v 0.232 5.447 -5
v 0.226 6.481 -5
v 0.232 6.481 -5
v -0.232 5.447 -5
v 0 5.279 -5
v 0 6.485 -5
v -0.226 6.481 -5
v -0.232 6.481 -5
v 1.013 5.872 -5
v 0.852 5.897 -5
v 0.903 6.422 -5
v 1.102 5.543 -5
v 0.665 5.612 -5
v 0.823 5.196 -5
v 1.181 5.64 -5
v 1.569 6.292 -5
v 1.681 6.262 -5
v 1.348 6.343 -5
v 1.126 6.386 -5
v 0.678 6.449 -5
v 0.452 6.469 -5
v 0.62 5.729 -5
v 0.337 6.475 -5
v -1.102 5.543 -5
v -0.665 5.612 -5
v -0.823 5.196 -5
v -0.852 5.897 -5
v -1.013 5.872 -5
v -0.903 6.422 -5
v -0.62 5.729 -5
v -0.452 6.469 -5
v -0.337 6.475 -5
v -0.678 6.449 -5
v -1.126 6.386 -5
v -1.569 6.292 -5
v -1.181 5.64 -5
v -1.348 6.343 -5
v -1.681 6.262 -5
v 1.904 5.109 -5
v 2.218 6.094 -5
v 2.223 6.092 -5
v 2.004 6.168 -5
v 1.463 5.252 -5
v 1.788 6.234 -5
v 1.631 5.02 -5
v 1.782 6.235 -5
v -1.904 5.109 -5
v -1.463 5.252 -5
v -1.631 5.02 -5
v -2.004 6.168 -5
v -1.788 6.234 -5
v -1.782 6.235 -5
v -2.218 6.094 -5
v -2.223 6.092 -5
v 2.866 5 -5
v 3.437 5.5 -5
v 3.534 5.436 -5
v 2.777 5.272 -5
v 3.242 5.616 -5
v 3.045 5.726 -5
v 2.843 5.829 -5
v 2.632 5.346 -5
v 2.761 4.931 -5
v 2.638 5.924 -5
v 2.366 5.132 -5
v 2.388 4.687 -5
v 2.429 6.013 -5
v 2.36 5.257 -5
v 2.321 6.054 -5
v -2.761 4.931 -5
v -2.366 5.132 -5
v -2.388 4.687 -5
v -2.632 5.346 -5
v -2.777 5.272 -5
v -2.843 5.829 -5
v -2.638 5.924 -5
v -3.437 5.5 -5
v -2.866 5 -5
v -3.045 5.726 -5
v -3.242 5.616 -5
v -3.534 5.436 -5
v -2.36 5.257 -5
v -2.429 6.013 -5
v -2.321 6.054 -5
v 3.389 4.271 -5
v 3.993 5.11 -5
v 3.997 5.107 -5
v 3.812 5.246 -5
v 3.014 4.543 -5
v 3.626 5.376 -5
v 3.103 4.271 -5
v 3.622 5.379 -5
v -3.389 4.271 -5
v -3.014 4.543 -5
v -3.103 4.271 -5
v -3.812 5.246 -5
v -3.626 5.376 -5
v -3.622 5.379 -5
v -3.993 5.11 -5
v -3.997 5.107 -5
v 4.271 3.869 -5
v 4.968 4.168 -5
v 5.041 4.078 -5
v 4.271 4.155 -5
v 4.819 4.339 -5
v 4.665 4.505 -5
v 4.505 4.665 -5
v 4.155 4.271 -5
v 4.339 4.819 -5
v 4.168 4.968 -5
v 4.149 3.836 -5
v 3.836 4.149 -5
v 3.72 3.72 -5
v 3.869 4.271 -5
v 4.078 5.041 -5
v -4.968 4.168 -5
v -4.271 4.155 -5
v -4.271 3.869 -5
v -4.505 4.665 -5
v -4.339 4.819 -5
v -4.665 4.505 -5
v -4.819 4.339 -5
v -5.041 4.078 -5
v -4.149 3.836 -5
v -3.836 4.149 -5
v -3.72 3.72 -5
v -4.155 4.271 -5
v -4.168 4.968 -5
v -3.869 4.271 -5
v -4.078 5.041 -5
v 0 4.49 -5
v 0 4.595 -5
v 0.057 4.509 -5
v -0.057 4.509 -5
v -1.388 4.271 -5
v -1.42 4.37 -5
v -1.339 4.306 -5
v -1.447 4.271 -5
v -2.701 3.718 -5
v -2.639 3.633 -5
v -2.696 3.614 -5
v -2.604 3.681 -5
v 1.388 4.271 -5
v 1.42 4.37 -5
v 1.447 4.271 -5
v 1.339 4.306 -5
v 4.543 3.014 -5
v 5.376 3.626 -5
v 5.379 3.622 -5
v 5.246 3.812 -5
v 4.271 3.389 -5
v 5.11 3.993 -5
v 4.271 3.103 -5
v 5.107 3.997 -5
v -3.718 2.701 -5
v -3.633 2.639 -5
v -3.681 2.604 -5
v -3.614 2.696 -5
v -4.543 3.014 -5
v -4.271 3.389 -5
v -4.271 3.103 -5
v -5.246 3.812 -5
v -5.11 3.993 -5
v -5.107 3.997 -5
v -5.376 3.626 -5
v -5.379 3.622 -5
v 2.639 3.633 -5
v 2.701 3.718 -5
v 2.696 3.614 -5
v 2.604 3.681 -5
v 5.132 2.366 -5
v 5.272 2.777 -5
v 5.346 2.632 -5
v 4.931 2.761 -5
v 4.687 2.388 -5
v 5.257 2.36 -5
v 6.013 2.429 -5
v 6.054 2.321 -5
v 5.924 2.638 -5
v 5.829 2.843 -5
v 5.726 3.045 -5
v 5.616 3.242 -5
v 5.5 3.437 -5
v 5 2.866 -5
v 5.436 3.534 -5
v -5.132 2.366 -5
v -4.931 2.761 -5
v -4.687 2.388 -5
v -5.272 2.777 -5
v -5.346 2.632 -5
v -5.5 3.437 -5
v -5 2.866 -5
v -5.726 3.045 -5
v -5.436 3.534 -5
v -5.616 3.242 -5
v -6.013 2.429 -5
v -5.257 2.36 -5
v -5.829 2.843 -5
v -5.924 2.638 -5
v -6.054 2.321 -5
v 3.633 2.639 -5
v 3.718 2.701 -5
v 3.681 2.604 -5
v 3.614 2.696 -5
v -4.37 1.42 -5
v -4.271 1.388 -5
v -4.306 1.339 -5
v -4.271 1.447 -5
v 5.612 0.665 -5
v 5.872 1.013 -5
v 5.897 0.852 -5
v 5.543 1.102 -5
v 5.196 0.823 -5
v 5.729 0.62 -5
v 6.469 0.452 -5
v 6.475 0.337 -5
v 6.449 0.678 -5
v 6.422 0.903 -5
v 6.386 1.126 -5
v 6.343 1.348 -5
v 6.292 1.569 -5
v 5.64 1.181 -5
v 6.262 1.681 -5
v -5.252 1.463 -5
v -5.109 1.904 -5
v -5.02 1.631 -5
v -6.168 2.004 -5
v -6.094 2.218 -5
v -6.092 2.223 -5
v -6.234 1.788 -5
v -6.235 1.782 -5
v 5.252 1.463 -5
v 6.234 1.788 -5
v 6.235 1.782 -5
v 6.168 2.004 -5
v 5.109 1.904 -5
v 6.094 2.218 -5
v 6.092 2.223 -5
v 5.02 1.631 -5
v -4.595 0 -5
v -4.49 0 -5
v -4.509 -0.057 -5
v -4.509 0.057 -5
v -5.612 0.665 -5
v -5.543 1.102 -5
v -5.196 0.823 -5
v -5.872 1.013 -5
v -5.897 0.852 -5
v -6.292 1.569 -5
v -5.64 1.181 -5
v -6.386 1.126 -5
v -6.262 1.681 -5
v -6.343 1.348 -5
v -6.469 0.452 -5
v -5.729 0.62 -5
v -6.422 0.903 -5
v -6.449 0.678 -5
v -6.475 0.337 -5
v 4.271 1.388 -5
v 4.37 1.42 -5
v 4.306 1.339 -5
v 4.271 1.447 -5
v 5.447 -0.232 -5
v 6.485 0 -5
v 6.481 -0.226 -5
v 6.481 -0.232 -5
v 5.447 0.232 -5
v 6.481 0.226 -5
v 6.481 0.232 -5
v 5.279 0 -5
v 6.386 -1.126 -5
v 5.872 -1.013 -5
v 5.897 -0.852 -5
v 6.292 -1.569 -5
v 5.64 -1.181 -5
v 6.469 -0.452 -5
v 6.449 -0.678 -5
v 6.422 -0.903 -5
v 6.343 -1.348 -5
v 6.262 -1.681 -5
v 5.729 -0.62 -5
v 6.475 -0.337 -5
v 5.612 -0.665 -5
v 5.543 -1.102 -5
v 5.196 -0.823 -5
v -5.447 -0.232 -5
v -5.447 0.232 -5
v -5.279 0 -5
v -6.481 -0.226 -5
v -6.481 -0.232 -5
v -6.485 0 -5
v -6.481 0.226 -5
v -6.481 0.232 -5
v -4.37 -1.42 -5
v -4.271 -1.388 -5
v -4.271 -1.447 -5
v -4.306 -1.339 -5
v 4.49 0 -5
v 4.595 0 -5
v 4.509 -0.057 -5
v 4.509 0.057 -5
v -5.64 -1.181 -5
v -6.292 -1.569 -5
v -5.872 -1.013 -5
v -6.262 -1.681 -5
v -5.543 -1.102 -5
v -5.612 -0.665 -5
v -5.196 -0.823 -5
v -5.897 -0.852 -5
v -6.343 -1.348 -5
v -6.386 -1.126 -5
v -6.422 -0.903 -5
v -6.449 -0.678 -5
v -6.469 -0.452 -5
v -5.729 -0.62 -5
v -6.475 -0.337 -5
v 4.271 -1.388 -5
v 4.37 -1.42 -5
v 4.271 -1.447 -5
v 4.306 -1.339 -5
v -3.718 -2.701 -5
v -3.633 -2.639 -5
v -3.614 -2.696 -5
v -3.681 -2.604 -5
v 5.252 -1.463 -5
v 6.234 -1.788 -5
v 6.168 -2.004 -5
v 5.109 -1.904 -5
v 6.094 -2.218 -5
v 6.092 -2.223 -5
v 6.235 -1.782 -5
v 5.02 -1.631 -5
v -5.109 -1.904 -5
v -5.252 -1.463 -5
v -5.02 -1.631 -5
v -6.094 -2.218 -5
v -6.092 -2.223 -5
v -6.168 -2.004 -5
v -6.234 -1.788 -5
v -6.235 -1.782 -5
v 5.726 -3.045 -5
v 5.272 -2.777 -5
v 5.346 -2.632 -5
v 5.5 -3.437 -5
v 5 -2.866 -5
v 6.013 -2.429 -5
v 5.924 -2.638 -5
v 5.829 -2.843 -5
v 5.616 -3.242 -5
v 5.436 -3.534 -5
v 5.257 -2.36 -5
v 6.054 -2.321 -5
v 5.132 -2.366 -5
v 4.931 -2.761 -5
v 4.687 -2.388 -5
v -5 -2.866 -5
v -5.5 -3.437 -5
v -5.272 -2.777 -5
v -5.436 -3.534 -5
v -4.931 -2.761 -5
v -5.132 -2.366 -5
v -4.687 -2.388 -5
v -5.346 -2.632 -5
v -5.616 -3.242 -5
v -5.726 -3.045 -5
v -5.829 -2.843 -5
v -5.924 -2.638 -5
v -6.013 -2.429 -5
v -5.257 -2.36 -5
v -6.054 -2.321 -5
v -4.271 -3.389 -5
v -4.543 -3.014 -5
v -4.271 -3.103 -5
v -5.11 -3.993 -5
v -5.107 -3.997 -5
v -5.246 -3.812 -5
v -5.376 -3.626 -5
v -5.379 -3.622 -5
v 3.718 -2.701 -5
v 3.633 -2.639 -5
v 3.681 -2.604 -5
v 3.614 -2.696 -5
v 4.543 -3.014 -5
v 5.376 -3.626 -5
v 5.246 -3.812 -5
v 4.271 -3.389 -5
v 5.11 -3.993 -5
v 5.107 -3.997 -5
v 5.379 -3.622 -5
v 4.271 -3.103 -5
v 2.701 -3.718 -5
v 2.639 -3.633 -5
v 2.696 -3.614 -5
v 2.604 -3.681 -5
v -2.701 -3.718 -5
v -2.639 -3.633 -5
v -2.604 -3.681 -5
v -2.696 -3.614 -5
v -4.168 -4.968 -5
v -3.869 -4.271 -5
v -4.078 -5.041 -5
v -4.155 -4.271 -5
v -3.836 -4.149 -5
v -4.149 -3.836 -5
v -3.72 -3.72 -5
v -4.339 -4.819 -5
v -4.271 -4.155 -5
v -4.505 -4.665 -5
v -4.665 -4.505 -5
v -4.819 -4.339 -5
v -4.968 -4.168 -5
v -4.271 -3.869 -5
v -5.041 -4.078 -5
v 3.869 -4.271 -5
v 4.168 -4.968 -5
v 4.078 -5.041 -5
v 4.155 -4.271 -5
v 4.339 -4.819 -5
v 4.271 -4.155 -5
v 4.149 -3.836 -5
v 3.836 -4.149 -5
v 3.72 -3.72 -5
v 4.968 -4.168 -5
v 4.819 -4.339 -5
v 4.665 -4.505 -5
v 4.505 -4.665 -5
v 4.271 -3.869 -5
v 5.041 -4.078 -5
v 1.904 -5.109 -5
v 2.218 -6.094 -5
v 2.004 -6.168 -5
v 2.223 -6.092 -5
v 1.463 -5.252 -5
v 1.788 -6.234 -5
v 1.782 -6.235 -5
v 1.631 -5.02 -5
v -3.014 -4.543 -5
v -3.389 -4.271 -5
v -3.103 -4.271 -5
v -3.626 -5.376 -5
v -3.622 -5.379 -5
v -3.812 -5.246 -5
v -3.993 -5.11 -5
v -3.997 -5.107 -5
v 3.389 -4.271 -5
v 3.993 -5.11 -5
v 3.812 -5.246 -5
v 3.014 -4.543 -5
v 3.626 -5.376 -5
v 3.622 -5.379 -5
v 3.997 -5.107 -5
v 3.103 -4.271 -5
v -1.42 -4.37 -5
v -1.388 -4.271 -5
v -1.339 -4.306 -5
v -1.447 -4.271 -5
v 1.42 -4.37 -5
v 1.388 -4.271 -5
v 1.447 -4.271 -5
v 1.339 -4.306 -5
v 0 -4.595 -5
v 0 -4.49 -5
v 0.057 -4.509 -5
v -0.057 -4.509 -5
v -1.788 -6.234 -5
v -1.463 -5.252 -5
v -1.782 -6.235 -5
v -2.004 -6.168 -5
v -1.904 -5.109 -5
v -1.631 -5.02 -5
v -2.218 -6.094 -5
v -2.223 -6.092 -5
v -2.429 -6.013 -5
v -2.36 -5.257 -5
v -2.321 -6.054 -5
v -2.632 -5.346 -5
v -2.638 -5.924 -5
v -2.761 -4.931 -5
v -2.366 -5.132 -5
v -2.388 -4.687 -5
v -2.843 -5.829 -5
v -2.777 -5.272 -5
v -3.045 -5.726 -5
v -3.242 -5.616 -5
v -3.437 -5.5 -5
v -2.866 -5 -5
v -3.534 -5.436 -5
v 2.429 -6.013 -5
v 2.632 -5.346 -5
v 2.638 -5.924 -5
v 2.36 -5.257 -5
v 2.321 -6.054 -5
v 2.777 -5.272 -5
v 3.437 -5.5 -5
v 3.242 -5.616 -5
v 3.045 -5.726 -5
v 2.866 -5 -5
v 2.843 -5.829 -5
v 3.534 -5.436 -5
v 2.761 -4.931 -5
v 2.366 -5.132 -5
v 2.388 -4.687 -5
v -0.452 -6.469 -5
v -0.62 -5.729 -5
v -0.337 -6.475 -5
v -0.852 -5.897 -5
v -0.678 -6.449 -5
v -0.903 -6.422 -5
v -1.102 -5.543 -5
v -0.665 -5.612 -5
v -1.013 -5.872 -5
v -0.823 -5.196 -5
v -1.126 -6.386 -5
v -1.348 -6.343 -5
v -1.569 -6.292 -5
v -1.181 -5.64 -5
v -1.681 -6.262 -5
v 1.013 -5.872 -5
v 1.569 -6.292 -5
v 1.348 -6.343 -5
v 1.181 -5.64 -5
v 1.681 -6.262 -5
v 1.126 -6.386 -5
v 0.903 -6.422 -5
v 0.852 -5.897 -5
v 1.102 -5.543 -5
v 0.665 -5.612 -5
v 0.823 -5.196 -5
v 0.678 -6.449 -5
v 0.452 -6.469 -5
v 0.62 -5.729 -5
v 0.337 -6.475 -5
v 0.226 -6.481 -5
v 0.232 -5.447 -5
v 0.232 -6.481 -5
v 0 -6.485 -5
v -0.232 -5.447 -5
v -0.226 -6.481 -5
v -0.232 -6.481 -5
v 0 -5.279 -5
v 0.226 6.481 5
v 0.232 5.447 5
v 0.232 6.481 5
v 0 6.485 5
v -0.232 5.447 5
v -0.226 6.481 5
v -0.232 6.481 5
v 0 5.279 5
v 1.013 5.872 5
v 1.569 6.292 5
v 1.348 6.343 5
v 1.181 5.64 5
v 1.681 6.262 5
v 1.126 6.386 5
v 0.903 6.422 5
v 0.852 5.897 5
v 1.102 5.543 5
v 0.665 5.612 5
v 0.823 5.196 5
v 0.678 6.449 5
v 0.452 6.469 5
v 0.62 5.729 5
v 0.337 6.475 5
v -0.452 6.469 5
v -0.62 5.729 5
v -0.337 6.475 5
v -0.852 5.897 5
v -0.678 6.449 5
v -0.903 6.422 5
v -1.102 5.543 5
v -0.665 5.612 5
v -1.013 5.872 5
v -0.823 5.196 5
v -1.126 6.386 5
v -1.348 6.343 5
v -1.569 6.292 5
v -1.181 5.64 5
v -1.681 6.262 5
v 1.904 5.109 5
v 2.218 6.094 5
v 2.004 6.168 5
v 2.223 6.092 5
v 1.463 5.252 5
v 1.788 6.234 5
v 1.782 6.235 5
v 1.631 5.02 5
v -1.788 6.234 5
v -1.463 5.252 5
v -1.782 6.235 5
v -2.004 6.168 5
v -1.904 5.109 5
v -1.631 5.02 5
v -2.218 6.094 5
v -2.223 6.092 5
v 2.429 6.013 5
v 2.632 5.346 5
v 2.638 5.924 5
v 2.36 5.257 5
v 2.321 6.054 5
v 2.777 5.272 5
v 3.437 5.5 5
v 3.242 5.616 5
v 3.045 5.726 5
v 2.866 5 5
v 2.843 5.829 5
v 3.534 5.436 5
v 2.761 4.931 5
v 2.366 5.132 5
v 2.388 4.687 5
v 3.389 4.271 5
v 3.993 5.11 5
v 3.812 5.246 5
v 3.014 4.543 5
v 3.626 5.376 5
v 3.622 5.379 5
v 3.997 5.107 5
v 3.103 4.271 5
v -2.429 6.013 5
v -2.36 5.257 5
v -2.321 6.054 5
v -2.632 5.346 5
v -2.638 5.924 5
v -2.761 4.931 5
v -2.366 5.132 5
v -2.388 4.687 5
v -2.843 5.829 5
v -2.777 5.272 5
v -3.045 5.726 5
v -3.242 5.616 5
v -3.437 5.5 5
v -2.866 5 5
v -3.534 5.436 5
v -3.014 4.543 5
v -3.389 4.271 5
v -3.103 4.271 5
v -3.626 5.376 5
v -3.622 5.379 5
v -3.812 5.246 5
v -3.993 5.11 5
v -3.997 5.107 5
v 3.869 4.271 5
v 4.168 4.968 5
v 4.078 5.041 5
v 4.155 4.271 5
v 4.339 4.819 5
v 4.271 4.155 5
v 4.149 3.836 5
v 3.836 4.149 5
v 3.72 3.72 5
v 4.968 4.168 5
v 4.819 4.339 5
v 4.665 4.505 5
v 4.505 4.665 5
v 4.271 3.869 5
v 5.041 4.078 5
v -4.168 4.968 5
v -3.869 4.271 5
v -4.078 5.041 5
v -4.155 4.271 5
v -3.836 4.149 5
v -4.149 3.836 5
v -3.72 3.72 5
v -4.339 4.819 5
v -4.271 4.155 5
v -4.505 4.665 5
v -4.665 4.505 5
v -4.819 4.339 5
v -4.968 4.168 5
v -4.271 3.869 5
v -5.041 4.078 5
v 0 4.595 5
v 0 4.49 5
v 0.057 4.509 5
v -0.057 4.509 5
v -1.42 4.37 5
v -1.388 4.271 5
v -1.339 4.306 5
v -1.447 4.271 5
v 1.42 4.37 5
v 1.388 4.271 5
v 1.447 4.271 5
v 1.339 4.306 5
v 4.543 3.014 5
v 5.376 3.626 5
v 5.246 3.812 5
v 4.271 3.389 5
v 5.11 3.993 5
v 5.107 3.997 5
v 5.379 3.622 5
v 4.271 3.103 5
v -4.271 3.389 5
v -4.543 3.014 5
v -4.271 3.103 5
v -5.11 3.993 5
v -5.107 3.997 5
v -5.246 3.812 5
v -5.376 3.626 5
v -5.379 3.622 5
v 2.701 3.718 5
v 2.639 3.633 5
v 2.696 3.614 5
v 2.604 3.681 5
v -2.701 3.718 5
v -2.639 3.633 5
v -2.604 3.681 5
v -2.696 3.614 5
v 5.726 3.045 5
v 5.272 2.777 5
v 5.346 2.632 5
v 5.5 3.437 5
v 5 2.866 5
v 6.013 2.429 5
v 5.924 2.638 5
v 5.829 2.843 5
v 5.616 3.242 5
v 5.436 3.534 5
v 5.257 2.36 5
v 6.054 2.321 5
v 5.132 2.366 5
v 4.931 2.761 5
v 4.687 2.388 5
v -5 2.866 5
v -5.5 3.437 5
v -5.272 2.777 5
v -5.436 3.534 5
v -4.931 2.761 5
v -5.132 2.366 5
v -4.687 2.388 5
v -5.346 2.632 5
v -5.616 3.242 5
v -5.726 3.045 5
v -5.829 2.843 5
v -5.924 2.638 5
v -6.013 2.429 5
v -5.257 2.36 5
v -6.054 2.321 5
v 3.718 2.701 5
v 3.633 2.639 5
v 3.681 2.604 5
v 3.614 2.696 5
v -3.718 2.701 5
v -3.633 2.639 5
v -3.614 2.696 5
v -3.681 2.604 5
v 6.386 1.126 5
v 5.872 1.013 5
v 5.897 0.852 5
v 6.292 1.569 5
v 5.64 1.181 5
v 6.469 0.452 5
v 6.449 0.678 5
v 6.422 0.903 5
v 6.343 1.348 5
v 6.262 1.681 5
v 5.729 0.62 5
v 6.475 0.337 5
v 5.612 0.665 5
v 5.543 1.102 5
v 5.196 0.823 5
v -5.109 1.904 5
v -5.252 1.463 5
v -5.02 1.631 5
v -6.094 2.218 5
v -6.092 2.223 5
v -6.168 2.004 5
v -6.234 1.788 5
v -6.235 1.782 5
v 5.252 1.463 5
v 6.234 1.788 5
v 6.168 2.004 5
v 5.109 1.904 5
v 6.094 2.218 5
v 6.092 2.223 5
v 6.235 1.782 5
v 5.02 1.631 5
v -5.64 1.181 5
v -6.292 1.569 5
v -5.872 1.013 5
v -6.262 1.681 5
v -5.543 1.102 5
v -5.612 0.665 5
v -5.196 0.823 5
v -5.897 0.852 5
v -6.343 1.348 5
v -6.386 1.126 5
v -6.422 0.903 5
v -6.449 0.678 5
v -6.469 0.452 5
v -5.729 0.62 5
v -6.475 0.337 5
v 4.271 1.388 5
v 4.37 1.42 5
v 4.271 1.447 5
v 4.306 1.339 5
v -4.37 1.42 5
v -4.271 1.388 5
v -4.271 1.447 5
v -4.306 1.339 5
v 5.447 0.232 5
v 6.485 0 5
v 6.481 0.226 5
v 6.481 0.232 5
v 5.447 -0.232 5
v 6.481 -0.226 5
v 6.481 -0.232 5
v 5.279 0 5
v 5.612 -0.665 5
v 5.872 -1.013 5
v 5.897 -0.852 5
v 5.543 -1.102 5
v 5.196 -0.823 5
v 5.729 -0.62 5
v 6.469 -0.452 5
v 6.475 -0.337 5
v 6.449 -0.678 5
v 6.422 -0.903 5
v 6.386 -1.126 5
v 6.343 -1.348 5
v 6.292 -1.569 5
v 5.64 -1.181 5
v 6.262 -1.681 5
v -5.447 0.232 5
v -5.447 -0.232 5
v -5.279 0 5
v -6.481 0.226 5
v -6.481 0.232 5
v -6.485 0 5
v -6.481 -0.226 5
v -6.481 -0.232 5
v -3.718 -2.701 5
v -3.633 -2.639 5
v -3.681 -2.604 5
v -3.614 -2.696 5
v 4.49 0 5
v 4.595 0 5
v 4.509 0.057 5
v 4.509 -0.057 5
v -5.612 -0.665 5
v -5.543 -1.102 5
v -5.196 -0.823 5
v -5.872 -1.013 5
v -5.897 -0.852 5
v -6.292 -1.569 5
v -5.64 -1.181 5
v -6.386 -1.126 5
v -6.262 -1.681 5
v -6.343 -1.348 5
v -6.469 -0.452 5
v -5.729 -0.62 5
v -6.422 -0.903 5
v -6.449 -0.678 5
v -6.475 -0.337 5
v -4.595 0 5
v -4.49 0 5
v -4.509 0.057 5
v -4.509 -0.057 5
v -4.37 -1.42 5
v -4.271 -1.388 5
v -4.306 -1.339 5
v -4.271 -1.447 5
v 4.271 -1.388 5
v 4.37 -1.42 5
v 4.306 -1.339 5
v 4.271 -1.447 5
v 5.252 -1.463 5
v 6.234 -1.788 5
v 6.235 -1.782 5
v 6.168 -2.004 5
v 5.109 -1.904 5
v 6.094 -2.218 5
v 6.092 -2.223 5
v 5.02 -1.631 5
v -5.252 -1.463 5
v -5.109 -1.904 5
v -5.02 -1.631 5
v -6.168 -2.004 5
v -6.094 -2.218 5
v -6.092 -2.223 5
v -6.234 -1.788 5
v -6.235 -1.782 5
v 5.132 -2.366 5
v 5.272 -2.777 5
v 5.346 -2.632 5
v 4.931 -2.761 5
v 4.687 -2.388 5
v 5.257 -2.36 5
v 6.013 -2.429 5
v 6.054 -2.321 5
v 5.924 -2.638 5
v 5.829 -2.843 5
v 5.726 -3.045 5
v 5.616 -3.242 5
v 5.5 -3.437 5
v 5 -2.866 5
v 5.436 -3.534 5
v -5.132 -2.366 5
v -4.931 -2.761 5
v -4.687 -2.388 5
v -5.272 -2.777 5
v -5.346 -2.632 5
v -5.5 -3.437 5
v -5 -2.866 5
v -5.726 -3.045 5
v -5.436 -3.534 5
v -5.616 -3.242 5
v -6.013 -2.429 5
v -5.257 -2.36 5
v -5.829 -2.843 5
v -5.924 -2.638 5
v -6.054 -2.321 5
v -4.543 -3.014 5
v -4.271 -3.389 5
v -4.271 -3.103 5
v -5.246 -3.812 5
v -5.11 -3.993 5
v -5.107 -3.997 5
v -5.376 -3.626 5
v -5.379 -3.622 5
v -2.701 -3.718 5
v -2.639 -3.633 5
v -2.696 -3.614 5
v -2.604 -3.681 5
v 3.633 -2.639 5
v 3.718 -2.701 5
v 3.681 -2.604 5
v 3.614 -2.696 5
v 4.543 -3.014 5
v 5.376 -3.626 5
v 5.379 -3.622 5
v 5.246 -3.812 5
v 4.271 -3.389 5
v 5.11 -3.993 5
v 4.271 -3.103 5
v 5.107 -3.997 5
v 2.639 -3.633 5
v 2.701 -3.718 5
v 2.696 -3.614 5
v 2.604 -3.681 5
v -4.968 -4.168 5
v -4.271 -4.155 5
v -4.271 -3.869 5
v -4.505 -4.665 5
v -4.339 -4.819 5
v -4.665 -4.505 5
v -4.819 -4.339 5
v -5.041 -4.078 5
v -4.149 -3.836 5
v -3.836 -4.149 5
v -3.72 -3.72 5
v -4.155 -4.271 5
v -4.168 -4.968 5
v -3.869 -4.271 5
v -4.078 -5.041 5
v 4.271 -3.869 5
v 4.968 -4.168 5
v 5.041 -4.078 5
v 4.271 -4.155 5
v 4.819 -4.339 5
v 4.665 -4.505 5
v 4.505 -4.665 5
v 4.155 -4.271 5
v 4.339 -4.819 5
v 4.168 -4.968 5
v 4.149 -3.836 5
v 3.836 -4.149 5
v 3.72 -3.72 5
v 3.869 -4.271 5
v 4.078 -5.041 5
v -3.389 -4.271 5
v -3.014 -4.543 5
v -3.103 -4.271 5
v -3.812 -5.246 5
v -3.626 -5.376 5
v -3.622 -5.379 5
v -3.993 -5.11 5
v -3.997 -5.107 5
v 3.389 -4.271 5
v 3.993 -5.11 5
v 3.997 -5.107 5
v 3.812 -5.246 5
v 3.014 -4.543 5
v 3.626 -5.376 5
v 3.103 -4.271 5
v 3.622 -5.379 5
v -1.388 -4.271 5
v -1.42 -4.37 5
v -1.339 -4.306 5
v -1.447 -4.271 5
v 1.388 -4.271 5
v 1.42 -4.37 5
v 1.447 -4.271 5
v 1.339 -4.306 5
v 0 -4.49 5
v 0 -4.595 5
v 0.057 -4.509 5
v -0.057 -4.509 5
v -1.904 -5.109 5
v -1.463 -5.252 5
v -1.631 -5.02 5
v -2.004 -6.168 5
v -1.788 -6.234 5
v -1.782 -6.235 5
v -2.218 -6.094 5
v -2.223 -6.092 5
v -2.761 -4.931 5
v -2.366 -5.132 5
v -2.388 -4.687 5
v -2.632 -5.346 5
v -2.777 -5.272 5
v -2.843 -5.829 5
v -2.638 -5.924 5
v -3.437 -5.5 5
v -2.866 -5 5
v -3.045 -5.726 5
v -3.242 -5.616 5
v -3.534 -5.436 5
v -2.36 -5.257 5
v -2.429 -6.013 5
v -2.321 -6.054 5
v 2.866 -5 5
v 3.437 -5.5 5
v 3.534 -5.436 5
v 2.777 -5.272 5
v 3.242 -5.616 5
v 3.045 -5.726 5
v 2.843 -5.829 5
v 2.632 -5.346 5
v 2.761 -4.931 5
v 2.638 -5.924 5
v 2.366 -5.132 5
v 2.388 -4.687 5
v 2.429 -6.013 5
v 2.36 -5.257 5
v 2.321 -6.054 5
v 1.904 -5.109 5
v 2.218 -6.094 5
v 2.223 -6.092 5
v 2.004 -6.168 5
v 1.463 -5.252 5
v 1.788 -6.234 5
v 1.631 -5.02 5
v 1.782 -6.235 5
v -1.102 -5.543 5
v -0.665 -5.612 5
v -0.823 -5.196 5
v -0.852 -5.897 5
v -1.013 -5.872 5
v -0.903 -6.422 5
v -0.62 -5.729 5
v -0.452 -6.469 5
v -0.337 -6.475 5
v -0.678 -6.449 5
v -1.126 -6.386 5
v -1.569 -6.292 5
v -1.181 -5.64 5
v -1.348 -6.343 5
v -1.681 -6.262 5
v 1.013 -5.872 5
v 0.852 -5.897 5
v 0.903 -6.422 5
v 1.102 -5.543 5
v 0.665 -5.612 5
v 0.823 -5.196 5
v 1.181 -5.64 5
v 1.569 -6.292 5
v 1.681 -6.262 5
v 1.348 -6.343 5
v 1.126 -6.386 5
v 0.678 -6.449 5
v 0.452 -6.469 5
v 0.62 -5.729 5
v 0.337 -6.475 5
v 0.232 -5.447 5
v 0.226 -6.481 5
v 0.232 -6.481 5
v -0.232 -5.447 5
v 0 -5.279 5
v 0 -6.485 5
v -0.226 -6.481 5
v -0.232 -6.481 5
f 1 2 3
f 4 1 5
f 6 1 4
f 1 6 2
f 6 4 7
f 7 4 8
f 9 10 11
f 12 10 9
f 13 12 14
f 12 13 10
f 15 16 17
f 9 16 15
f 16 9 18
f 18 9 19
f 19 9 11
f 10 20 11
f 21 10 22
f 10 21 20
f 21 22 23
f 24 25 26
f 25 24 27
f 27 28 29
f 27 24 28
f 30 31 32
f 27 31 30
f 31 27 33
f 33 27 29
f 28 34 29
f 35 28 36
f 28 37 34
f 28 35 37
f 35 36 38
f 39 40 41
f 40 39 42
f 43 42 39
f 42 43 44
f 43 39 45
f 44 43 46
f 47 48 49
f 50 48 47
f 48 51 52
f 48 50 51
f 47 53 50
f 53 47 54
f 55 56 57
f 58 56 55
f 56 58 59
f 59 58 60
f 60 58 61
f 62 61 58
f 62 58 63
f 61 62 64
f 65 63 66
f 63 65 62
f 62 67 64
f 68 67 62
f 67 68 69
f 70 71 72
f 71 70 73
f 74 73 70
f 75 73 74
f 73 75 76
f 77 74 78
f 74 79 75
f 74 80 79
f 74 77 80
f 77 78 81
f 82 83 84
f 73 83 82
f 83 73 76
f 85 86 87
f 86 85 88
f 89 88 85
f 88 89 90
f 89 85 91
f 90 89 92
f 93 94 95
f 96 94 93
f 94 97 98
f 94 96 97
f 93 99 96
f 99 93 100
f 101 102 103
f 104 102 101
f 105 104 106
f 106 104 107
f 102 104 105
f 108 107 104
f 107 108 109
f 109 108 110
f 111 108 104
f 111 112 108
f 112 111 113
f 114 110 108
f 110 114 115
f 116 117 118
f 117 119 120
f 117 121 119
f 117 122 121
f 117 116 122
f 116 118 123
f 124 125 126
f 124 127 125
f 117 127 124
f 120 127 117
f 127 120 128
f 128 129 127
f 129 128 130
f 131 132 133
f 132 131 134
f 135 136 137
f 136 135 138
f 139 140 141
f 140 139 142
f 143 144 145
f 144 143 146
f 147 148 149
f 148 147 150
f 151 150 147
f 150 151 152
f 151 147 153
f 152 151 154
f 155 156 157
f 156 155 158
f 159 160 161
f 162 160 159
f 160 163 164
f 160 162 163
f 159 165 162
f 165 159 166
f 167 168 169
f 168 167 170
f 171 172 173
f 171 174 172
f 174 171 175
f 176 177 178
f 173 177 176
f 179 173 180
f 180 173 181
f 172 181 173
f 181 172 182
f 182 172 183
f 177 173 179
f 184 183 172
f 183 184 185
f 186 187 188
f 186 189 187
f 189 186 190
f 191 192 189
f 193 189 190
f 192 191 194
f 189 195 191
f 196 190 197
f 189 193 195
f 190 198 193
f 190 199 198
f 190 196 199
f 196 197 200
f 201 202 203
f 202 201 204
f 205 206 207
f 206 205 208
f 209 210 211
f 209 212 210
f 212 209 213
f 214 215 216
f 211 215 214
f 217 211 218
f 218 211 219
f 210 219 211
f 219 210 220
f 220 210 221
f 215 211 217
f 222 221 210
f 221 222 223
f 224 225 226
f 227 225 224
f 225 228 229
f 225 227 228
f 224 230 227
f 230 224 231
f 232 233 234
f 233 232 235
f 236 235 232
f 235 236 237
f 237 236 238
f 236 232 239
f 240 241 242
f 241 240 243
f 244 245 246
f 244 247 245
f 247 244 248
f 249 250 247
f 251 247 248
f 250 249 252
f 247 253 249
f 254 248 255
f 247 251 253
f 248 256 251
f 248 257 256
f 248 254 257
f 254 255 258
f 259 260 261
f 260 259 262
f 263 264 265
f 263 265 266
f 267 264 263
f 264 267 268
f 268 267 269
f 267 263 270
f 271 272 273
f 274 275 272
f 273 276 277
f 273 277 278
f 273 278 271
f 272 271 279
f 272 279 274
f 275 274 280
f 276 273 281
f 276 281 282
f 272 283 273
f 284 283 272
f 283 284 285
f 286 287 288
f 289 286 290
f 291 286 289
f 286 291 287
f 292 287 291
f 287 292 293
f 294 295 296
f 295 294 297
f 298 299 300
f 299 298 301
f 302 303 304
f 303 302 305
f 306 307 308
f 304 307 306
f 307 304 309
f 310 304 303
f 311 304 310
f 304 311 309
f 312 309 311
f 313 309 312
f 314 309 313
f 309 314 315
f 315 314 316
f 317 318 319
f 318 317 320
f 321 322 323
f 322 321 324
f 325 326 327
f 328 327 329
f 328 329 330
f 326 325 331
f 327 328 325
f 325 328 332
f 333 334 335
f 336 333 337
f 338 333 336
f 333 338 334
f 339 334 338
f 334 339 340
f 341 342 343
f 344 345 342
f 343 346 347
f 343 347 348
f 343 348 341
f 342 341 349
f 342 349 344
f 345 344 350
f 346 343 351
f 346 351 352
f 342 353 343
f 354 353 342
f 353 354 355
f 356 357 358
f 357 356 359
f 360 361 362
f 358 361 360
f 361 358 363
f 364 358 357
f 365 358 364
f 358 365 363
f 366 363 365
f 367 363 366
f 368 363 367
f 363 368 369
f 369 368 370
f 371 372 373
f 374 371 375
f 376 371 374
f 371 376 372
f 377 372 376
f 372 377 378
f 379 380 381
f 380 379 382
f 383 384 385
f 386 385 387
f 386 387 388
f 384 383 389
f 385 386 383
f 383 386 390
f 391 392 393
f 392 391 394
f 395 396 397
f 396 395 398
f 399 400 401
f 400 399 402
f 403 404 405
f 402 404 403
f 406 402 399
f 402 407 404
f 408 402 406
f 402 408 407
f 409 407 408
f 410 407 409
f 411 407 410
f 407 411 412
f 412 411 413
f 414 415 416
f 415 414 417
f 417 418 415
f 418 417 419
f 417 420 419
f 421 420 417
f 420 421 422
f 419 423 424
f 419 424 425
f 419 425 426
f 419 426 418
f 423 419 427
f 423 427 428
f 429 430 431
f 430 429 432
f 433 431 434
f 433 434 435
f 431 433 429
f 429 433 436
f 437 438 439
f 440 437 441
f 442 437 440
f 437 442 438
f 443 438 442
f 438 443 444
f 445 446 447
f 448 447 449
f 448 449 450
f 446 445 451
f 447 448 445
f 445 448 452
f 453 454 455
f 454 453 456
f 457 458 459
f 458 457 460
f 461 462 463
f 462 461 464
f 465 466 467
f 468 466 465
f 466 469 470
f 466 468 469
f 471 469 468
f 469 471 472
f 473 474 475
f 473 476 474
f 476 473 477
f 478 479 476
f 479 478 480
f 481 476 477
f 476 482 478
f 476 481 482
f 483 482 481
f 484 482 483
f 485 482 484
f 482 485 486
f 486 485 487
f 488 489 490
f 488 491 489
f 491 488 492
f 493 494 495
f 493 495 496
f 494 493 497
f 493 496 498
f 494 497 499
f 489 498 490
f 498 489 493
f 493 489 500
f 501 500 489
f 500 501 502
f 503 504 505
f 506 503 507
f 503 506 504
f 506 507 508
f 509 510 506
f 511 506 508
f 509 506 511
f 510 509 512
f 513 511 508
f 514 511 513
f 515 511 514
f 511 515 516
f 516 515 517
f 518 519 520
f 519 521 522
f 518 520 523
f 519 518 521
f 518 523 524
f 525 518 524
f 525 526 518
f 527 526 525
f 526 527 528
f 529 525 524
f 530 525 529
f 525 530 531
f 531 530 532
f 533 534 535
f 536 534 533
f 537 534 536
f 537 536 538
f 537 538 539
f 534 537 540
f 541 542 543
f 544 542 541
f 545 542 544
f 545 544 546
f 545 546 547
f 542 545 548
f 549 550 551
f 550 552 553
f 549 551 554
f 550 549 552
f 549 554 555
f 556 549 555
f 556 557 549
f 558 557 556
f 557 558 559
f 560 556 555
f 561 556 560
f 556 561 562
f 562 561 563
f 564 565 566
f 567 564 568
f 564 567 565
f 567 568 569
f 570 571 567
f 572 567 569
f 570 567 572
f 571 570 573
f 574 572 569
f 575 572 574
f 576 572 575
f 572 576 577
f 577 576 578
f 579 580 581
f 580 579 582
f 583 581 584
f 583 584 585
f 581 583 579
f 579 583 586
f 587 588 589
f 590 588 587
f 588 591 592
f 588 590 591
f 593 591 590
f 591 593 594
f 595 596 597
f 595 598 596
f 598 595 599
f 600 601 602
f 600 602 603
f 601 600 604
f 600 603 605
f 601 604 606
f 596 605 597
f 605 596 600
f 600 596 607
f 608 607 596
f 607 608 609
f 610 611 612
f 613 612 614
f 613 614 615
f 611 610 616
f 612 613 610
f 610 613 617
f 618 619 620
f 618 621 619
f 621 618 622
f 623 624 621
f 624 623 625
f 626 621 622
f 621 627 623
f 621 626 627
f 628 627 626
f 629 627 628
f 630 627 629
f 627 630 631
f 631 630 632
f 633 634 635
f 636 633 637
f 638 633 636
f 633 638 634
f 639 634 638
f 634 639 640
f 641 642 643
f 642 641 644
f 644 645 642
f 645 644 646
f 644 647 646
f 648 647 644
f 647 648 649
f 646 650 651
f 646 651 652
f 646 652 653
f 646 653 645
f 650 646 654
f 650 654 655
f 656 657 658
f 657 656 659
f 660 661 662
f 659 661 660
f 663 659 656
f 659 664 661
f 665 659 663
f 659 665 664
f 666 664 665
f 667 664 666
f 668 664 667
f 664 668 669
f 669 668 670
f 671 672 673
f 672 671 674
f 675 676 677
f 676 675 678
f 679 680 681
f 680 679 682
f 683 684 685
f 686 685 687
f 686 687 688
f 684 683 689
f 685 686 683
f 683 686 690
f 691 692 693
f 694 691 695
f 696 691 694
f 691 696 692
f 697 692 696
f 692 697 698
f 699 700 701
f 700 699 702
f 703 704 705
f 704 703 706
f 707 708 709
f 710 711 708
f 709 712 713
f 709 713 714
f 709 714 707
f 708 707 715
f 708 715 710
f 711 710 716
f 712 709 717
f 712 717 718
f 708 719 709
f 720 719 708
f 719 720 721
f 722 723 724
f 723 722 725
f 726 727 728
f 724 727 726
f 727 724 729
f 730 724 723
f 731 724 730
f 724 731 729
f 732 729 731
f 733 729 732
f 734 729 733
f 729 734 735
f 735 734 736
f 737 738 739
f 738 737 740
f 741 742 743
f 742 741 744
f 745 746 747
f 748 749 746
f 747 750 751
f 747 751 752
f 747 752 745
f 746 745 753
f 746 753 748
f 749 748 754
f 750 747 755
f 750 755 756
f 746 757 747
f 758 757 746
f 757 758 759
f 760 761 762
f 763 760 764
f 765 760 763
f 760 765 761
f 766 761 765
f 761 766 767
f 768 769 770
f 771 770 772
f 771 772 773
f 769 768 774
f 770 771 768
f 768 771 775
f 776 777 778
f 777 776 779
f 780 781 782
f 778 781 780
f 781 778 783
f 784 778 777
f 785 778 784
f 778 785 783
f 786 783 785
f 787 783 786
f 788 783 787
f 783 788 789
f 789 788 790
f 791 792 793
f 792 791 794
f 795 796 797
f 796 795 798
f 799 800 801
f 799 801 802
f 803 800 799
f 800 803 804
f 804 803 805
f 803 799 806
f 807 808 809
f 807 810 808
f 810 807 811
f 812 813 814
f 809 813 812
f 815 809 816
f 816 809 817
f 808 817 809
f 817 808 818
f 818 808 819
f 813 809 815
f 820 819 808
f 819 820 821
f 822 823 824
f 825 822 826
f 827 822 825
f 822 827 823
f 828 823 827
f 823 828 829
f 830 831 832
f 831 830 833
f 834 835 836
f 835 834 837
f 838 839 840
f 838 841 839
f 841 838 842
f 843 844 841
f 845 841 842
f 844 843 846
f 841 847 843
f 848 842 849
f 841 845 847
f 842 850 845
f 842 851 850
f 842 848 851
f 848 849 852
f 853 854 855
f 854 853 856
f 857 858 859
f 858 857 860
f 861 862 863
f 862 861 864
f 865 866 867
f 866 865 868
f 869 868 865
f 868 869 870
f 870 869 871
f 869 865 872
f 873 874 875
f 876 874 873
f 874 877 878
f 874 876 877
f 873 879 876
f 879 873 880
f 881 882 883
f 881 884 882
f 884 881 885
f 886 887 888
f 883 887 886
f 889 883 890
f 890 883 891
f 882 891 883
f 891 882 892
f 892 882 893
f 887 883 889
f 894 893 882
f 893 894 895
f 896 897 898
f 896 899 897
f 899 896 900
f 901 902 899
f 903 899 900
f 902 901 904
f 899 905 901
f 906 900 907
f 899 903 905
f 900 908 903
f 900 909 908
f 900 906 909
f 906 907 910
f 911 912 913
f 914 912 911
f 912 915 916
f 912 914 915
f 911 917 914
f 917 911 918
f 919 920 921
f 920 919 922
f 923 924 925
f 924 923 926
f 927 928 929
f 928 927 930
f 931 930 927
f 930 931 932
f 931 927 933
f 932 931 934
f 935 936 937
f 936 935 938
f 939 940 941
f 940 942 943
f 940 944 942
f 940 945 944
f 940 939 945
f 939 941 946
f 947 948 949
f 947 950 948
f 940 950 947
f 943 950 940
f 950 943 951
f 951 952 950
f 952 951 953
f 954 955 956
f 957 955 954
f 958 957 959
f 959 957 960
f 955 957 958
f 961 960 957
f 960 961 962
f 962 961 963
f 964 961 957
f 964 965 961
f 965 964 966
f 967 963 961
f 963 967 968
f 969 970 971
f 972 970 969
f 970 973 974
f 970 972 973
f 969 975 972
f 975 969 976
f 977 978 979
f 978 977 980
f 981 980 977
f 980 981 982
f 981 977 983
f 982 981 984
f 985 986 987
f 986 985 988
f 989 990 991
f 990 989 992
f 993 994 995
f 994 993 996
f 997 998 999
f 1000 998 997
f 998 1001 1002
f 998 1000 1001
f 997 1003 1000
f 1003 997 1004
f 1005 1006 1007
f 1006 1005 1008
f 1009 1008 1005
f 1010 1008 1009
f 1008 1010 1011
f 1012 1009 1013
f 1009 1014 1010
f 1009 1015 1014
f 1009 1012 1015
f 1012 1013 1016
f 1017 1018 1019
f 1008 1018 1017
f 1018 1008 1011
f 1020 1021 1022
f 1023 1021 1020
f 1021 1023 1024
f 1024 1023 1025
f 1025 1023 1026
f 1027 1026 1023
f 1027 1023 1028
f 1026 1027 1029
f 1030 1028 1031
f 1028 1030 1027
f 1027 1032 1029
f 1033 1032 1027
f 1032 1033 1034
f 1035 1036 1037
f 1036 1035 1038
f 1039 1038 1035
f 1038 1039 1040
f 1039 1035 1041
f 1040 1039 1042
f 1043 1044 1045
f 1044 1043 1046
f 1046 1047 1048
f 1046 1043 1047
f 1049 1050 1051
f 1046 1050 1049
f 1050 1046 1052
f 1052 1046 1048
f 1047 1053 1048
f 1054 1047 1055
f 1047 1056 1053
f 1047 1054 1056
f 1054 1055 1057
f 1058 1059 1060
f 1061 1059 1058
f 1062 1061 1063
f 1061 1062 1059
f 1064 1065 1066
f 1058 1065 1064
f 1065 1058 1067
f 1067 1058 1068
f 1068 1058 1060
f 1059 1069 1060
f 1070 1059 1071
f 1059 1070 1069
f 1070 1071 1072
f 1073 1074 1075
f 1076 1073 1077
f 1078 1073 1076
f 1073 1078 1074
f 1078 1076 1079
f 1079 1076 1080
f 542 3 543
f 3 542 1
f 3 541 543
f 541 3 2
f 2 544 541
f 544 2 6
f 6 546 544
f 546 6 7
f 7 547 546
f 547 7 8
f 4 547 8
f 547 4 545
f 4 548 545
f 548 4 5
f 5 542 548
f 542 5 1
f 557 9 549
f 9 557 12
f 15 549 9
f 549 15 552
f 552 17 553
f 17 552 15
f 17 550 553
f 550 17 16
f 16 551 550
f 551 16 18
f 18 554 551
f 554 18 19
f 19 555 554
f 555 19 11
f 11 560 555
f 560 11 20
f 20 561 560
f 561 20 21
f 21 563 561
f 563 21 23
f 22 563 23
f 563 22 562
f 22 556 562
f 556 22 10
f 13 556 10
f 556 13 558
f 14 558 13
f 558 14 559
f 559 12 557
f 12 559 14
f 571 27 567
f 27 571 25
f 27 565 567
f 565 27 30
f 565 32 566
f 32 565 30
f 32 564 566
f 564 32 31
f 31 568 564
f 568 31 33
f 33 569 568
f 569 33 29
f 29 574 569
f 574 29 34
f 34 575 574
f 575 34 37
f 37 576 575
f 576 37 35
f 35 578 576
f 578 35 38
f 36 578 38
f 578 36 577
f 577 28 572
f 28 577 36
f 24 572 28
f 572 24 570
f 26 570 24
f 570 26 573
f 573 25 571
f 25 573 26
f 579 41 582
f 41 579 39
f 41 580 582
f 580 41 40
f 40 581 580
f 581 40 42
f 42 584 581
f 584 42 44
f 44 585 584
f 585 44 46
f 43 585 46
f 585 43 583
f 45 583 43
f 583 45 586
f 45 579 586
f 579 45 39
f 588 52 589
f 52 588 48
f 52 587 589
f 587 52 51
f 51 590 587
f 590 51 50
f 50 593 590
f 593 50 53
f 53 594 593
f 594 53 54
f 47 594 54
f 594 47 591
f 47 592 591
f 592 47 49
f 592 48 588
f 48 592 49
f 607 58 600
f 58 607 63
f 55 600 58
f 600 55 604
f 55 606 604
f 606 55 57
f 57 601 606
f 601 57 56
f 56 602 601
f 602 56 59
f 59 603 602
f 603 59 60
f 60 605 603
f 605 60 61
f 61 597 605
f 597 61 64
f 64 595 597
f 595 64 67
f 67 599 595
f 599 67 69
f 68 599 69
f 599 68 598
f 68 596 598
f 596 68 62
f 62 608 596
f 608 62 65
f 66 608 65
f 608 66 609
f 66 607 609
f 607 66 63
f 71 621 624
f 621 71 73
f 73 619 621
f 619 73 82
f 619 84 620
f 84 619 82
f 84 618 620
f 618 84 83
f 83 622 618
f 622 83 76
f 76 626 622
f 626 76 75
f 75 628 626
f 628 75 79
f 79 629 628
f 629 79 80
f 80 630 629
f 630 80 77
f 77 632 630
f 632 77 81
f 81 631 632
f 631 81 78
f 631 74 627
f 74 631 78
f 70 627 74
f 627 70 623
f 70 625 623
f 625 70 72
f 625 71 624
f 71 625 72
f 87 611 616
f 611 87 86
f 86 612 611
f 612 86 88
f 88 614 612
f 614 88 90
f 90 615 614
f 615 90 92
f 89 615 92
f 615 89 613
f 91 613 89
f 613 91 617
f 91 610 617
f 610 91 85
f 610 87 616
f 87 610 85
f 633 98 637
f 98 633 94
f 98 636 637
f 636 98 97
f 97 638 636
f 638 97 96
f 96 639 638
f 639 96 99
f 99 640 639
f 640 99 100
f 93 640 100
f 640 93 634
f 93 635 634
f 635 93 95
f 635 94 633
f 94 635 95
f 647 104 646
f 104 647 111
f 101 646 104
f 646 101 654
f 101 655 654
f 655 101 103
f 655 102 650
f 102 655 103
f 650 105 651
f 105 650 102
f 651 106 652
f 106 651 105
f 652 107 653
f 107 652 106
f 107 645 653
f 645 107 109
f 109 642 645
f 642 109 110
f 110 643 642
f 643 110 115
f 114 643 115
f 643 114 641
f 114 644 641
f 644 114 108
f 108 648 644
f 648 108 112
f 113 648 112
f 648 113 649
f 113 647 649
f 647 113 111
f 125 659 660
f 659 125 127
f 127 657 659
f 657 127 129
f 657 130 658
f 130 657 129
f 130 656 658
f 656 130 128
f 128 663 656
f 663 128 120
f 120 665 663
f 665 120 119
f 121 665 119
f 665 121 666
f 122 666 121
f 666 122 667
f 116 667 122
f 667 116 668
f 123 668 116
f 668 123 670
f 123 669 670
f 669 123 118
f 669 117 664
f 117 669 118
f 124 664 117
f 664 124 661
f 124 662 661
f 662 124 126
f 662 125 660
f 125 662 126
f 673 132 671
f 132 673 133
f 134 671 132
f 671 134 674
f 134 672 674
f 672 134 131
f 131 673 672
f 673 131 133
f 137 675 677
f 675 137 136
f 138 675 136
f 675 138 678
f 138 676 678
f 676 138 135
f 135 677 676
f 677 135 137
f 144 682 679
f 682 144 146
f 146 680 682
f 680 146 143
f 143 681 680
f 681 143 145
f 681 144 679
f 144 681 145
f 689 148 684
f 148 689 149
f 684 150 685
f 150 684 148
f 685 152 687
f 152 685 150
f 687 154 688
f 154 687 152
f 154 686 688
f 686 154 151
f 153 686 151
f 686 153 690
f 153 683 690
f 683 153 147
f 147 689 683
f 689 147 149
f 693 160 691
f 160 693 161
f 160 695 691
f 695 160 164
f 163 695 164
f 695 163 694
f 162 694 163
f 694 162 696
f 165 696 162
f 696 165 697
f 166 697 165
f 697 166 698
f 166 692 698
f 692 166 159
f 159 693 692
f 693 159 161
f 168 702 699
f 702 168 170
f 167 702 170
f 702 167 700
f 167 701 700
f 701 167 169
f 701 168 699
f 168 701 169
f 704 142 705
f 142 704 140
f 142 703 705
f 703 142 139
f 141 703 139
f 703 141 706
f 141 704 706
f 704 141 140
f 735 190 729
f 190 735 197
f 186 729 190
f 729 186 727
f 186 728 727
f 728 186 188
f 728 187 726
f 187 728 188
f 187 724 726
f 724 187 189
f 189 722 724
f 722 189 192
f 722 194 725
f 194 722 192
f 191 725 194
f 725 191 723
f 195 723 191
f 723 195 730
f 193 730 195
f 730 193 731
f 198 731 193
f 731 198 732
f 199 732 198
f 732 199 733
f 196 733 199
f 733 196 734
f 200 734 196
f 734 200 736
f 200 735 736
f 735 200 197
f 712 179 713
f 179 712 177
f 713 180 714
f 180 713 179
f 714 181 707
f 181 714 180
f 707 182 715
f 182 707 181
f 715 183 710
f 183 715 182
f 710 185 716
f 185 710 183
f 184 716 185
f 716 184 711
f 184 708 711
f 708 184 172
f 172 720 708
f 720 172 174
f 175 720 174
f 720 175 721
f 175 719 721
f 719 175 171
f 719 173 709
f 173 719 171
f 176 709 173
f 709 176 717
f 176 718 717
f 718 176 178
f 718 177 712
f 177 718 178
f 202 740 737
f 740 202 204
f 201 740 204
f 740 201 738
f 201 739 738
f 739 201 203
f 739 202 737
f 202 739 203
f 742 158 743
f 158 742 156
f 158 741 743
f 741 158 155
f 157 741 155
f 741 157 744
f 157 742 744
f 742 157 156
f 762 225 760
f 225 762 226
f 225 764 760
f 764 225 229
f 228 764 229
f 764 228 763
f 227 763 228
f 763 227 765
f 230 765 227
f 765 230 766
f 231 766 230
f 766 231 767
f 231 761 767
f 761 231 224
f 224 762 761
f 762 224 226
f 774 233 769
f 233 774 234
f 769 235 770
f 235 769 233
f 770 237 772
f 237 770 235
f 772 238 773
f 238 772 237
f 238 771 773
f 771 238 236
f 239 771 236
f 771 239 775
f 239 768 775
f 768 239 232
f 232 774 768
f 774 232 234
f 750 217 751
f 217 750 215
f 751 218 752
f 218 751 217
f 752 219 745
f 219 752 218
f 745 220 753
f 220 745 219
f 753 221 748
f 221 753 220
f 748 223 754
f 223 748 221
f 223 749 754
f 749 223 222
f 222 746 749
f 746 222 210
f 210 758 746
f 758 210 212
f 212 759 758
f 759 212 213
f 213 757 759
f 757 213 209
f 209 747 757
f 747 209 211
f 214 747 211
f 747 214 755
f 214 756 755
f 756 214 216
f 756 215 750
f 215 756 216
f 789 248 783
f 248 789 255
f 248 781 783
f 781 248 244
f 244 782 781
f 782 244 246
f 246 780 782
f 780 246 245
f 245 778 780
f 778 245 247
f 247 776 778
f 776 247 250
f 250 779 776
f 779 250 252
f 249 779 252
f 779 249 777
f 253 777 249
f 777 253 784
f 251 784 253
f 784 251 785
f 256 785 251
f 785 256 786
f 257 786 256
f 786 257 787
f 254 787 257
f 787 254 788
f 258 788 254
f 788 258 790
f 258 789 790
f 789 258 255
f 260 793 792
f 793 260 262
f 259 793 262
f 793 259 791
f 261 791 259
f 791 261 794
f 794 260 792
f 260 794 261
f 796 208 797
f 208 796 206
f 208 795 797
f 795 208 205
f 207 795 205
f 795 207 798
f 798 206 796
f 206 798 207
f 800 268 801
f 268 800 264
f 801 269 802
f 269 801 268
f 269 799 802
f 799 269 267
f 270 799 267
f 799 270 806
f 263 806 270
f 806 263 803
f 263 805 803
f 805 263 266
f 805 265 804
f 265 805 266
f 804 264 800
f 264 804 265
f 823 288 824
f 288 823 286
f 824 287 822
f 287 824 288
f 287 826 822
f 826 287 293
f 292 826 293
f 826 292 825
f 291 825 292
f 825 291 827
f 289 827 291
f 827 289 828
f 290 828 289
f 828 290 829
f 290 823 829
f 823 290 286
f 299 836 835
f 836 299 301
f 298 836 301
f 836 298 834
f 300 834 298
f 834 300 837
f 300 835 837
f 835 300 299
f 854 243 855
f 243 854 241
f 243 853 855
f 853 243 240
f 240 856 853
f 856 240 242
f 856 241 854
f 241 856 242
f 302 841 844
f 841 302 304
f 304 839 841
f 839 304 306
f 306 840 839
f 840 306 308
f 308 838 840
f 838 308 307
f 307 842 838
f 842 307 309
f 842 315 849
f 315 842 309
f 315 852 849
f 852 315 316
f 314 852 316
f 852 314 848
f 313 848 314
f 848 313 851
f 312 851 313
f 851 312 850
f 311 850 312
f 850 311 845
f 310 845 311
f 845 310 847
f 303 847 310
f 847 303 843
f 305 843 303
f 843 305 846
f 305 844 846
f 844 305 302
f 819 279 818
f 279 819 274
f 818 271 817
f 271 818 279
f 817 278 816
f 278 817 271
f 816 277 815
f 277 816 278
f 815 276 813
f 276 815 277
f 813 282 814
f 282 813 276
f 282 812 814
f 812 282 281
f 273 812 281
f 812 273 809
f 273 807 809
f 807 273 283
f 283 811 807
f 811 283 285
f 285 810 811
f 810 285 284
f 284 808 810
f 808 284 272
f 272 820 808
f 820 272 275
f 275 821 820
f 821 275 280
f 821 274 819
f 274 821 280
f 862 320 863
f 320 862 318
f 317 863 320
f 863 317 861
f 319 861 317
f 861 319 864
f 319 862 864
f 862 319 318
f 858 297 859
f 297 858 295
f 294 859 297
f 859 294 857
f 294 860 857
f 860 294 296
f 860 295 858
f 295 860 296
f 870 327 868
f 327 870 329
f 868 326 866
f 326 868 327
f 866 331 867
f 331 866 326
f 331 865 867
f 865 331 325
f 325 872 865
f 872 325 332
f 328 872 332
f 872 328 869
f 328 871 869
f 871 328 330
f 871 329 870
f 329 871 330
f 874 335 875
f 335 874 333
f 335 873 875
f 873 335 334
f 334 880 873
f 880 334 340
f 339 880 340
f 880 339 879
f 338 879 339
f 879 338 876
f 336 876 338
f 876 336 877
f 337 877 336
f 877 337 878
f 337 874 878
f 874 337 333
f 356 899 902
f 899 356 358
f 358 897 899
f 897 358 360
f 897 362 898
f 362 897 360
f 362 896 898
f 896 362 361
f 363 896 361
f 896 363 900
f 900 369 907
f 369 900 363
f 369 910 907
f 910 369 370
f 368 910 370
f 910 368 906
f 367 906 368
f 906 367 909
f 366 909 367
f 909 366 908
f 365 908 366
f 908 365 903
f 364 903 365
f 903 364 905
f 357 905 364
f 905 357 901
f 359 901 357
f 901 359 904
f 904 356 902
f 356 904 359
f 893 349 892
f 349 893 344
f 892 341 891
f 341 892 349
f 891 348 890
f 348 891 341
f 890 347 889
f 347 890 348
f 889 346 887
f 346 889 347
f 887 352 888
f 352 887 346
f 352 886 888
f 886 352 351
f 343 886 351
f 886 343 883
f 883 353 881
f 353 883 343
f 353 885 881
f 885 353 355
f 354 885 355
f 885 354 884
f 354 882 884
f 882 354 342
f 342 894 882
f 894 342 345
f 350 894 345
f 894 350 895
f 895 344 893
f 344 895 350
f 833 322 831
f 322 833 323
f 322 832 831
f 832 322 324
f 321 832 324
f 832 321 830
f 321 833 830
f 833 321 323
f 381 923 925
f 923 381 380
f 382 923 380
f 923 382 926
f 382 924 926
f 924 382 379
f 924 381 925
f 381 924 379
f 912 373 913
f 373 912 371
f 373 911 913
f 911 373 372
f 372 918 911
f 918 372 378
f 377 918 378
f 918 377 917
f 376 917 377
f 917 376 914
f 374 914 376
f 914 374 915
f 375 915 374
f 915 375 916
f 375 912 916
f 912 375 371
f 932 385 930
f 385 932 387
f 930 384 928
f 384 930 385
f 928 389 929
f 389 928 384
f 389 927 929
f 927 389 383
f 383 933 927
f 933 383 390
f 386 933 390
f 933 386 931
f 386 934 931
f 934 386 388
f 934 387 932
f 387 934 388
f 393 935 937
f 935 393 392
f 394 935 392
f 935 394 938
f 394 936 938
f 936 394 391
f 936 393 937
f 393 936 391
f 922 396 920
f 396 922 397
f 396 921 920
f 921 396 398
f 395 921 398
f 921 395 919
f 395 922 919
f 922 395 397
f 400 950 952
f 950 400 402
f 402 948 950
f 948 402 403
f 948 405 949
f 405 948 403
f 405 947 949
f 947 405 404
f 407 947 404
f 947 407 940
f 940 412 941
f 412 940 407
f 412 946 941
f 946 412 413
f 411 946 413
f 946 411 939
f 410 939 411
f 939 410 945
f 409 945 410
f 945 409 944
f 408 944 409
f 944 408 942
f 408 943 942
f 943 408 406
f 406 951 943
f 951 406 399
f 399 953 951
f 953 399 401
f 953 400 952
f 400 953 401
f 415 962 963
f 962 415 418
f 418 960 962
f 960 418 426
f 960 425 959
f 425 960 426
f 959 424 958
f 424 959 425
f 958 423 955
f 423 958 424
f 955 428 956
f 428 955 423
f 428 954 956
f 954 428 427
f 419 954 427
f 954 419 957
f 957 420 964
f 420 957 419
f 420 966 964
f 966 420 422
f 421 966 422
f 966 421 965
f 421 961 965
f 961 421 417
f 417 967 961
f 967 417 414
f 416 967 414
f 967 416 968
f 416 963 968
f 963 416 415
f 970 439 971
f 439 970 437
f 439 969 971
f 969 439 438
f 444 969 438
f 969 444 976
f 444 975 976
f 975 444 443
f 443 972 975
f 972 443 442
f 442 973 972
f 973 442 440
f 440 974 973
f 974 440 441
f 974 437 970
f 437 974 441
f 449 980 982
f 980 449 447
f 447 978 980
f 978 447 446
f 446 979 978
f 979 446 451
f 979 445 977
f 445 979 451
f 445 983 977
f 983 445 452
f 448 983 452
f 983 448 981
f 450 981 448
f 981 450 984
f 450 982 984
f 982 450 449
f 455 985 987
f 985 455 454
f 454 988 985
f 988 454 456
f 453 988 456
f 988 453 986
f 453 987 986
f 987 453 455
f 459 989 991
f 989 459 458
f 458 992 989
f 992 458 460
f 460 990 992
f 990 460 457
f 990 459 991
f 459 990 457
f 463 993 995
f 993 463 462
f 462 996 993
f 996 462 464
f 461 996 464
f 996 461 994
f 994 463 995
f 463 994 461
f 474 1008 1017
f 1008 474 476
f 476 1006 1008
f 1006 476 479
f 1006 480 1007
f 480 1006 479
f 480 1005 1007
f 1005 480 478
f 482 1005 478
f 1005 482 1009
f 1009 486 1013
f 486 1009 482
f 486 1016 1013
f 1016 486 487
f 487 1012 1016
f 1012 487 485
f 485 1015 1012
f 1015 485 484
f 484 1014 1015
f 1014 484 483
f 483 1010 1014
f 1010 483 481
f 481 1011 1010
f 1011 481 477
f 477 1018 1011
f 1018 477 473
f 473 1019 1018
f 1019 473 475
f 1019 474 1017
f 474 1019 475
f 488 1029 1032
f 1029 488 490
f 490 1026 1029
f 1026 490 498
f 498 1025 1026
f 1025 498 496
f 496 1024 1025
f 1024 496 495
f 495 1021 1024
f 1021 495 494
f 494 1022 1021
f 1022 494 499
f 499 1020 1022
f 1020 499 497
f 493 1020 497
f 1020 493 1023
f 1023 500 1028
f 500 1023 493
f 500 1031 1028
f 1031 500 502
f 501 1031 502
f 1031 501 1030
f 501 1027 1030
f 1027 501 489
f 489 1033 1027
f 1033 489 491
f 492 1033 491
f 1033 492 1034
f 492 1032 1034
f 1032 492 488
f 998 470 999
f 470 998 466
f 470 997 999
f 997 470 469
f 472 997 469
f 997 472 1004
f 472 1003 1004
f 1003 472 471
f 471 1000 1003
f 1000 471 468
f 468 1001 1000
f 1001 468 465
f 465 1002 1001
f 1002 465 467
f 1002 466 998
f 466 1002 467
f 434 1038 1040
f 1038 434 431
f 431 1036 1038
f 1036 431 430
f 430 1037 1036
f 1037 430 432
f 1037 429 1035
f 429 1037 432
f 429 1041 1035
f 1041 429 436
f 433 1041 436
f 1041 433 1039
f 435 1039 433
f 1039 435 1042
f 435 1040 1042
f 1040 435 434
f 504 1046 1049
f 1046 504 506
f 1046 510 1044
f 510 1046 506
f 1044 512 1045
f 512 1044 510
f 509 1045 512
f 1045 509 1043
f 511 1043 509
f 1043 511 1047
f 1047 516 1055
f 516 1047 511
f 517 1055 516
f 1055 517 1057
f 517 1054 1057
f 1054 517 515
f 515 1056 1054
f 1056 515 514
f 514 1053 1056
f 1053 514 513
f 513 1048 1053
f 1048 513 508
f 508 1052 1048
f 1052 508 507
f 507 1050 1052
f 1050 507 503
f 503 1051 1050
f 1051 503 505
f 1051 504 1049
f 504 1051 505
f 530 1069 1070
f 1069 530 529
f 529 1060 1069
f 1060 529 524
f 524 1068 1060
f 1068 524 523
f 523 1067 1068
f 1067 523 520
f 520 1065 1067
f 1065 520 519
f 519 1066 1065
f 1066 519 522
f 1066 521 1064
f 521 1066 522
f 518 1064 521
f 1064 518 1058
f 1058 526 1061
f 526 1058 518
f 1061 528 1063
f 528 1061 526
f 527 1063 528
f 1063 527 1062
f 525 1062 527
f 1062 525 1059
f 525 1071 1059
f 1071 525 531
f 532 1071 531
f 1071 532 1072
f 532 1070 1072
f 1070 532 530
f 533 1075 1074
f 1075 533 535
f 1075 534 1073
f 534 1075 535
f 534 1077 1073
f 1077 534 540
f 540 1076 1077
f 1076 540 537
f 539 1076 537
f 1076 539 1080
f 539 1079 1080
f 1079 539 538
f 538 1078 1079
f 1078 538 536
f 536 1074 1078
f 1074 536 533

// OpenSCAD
$fn = 180;

// Timing pulley: 20 teeth, 12.22mm pitch diameter
teeth   = 20;
pitch_d = 12.22;                 // mm (pitch diameter)
pitch_r = pitch_d/2;
pitch   = PI * pitch_d / teeth;  // circular pitch (mm)

pulley_width = 10;               // mm
bore_d       = 5;                // mm

// Groove geometry (timing-belt tooth space), robust boolean-friendly
groove_depth = 0.75;             // radial depth (mm)
groove_open  = pitch * 0.55;     // width at OD (mm)
groove_root  = pitch * 0.25;     // width at groove bottom (mm)

// Ensure pitch circle is centered in groove depth:
// pitch_r = outer_r - groove_depth/2  => outer_r = pitch_r + groove_depth/2
outer_r = pitch_r + groove_depth/2;
root_r  = outer_r - groove_depth;

eps = 0.05;

// Convert chord width at radius r to included angle (degrees)
function chord_to_deg(w, r) = 2 * asin(min(1, (w/2)/r)) * 180 / PI;

module groove2d() {
    // Trapezoid groove centered on +X axis, spanning from root_r to outer_r
    ang_outer = chord_to_deg(groove_open, outer_r);
    ang_root  = chord_to_deg(groove_root, root_r);

    polygon(points=[
        [root_r  * cos(-ang_root/2),  root_r  * sin(-ang_root/2)],
        [outer_r * cos(-ang_outer/2), outer_r * sin(-ang_outer/2)],
        [outer_r * cos( ang_outer/2), outer_r * sin( ang_outer/2)],
        [root_r  * cos( ang_root/2),  root_r  * sin( ang_root/2)]
    ]);
}

module pulley2d() {
    difference() {
        circle(r=outer_r);

        // Cut grooves; slightly extend radially to avoid coincident edges
        for (i = [0:teeth-1]) {
            rotate(i * 360 / teeth)
                offset(delta=eps)
                    groove2d();
        }
    }
}

module pulley() {
    difference() {
        linear_extrude(height=pulley_width, center=true, convexity=10)
            pulley2d();

        // Bore (through), slightly longer to guarantee clean subtraction
        cylinder(d=bore_d, h=pulley_width + 2, center=true);
    }
}

pulley();
